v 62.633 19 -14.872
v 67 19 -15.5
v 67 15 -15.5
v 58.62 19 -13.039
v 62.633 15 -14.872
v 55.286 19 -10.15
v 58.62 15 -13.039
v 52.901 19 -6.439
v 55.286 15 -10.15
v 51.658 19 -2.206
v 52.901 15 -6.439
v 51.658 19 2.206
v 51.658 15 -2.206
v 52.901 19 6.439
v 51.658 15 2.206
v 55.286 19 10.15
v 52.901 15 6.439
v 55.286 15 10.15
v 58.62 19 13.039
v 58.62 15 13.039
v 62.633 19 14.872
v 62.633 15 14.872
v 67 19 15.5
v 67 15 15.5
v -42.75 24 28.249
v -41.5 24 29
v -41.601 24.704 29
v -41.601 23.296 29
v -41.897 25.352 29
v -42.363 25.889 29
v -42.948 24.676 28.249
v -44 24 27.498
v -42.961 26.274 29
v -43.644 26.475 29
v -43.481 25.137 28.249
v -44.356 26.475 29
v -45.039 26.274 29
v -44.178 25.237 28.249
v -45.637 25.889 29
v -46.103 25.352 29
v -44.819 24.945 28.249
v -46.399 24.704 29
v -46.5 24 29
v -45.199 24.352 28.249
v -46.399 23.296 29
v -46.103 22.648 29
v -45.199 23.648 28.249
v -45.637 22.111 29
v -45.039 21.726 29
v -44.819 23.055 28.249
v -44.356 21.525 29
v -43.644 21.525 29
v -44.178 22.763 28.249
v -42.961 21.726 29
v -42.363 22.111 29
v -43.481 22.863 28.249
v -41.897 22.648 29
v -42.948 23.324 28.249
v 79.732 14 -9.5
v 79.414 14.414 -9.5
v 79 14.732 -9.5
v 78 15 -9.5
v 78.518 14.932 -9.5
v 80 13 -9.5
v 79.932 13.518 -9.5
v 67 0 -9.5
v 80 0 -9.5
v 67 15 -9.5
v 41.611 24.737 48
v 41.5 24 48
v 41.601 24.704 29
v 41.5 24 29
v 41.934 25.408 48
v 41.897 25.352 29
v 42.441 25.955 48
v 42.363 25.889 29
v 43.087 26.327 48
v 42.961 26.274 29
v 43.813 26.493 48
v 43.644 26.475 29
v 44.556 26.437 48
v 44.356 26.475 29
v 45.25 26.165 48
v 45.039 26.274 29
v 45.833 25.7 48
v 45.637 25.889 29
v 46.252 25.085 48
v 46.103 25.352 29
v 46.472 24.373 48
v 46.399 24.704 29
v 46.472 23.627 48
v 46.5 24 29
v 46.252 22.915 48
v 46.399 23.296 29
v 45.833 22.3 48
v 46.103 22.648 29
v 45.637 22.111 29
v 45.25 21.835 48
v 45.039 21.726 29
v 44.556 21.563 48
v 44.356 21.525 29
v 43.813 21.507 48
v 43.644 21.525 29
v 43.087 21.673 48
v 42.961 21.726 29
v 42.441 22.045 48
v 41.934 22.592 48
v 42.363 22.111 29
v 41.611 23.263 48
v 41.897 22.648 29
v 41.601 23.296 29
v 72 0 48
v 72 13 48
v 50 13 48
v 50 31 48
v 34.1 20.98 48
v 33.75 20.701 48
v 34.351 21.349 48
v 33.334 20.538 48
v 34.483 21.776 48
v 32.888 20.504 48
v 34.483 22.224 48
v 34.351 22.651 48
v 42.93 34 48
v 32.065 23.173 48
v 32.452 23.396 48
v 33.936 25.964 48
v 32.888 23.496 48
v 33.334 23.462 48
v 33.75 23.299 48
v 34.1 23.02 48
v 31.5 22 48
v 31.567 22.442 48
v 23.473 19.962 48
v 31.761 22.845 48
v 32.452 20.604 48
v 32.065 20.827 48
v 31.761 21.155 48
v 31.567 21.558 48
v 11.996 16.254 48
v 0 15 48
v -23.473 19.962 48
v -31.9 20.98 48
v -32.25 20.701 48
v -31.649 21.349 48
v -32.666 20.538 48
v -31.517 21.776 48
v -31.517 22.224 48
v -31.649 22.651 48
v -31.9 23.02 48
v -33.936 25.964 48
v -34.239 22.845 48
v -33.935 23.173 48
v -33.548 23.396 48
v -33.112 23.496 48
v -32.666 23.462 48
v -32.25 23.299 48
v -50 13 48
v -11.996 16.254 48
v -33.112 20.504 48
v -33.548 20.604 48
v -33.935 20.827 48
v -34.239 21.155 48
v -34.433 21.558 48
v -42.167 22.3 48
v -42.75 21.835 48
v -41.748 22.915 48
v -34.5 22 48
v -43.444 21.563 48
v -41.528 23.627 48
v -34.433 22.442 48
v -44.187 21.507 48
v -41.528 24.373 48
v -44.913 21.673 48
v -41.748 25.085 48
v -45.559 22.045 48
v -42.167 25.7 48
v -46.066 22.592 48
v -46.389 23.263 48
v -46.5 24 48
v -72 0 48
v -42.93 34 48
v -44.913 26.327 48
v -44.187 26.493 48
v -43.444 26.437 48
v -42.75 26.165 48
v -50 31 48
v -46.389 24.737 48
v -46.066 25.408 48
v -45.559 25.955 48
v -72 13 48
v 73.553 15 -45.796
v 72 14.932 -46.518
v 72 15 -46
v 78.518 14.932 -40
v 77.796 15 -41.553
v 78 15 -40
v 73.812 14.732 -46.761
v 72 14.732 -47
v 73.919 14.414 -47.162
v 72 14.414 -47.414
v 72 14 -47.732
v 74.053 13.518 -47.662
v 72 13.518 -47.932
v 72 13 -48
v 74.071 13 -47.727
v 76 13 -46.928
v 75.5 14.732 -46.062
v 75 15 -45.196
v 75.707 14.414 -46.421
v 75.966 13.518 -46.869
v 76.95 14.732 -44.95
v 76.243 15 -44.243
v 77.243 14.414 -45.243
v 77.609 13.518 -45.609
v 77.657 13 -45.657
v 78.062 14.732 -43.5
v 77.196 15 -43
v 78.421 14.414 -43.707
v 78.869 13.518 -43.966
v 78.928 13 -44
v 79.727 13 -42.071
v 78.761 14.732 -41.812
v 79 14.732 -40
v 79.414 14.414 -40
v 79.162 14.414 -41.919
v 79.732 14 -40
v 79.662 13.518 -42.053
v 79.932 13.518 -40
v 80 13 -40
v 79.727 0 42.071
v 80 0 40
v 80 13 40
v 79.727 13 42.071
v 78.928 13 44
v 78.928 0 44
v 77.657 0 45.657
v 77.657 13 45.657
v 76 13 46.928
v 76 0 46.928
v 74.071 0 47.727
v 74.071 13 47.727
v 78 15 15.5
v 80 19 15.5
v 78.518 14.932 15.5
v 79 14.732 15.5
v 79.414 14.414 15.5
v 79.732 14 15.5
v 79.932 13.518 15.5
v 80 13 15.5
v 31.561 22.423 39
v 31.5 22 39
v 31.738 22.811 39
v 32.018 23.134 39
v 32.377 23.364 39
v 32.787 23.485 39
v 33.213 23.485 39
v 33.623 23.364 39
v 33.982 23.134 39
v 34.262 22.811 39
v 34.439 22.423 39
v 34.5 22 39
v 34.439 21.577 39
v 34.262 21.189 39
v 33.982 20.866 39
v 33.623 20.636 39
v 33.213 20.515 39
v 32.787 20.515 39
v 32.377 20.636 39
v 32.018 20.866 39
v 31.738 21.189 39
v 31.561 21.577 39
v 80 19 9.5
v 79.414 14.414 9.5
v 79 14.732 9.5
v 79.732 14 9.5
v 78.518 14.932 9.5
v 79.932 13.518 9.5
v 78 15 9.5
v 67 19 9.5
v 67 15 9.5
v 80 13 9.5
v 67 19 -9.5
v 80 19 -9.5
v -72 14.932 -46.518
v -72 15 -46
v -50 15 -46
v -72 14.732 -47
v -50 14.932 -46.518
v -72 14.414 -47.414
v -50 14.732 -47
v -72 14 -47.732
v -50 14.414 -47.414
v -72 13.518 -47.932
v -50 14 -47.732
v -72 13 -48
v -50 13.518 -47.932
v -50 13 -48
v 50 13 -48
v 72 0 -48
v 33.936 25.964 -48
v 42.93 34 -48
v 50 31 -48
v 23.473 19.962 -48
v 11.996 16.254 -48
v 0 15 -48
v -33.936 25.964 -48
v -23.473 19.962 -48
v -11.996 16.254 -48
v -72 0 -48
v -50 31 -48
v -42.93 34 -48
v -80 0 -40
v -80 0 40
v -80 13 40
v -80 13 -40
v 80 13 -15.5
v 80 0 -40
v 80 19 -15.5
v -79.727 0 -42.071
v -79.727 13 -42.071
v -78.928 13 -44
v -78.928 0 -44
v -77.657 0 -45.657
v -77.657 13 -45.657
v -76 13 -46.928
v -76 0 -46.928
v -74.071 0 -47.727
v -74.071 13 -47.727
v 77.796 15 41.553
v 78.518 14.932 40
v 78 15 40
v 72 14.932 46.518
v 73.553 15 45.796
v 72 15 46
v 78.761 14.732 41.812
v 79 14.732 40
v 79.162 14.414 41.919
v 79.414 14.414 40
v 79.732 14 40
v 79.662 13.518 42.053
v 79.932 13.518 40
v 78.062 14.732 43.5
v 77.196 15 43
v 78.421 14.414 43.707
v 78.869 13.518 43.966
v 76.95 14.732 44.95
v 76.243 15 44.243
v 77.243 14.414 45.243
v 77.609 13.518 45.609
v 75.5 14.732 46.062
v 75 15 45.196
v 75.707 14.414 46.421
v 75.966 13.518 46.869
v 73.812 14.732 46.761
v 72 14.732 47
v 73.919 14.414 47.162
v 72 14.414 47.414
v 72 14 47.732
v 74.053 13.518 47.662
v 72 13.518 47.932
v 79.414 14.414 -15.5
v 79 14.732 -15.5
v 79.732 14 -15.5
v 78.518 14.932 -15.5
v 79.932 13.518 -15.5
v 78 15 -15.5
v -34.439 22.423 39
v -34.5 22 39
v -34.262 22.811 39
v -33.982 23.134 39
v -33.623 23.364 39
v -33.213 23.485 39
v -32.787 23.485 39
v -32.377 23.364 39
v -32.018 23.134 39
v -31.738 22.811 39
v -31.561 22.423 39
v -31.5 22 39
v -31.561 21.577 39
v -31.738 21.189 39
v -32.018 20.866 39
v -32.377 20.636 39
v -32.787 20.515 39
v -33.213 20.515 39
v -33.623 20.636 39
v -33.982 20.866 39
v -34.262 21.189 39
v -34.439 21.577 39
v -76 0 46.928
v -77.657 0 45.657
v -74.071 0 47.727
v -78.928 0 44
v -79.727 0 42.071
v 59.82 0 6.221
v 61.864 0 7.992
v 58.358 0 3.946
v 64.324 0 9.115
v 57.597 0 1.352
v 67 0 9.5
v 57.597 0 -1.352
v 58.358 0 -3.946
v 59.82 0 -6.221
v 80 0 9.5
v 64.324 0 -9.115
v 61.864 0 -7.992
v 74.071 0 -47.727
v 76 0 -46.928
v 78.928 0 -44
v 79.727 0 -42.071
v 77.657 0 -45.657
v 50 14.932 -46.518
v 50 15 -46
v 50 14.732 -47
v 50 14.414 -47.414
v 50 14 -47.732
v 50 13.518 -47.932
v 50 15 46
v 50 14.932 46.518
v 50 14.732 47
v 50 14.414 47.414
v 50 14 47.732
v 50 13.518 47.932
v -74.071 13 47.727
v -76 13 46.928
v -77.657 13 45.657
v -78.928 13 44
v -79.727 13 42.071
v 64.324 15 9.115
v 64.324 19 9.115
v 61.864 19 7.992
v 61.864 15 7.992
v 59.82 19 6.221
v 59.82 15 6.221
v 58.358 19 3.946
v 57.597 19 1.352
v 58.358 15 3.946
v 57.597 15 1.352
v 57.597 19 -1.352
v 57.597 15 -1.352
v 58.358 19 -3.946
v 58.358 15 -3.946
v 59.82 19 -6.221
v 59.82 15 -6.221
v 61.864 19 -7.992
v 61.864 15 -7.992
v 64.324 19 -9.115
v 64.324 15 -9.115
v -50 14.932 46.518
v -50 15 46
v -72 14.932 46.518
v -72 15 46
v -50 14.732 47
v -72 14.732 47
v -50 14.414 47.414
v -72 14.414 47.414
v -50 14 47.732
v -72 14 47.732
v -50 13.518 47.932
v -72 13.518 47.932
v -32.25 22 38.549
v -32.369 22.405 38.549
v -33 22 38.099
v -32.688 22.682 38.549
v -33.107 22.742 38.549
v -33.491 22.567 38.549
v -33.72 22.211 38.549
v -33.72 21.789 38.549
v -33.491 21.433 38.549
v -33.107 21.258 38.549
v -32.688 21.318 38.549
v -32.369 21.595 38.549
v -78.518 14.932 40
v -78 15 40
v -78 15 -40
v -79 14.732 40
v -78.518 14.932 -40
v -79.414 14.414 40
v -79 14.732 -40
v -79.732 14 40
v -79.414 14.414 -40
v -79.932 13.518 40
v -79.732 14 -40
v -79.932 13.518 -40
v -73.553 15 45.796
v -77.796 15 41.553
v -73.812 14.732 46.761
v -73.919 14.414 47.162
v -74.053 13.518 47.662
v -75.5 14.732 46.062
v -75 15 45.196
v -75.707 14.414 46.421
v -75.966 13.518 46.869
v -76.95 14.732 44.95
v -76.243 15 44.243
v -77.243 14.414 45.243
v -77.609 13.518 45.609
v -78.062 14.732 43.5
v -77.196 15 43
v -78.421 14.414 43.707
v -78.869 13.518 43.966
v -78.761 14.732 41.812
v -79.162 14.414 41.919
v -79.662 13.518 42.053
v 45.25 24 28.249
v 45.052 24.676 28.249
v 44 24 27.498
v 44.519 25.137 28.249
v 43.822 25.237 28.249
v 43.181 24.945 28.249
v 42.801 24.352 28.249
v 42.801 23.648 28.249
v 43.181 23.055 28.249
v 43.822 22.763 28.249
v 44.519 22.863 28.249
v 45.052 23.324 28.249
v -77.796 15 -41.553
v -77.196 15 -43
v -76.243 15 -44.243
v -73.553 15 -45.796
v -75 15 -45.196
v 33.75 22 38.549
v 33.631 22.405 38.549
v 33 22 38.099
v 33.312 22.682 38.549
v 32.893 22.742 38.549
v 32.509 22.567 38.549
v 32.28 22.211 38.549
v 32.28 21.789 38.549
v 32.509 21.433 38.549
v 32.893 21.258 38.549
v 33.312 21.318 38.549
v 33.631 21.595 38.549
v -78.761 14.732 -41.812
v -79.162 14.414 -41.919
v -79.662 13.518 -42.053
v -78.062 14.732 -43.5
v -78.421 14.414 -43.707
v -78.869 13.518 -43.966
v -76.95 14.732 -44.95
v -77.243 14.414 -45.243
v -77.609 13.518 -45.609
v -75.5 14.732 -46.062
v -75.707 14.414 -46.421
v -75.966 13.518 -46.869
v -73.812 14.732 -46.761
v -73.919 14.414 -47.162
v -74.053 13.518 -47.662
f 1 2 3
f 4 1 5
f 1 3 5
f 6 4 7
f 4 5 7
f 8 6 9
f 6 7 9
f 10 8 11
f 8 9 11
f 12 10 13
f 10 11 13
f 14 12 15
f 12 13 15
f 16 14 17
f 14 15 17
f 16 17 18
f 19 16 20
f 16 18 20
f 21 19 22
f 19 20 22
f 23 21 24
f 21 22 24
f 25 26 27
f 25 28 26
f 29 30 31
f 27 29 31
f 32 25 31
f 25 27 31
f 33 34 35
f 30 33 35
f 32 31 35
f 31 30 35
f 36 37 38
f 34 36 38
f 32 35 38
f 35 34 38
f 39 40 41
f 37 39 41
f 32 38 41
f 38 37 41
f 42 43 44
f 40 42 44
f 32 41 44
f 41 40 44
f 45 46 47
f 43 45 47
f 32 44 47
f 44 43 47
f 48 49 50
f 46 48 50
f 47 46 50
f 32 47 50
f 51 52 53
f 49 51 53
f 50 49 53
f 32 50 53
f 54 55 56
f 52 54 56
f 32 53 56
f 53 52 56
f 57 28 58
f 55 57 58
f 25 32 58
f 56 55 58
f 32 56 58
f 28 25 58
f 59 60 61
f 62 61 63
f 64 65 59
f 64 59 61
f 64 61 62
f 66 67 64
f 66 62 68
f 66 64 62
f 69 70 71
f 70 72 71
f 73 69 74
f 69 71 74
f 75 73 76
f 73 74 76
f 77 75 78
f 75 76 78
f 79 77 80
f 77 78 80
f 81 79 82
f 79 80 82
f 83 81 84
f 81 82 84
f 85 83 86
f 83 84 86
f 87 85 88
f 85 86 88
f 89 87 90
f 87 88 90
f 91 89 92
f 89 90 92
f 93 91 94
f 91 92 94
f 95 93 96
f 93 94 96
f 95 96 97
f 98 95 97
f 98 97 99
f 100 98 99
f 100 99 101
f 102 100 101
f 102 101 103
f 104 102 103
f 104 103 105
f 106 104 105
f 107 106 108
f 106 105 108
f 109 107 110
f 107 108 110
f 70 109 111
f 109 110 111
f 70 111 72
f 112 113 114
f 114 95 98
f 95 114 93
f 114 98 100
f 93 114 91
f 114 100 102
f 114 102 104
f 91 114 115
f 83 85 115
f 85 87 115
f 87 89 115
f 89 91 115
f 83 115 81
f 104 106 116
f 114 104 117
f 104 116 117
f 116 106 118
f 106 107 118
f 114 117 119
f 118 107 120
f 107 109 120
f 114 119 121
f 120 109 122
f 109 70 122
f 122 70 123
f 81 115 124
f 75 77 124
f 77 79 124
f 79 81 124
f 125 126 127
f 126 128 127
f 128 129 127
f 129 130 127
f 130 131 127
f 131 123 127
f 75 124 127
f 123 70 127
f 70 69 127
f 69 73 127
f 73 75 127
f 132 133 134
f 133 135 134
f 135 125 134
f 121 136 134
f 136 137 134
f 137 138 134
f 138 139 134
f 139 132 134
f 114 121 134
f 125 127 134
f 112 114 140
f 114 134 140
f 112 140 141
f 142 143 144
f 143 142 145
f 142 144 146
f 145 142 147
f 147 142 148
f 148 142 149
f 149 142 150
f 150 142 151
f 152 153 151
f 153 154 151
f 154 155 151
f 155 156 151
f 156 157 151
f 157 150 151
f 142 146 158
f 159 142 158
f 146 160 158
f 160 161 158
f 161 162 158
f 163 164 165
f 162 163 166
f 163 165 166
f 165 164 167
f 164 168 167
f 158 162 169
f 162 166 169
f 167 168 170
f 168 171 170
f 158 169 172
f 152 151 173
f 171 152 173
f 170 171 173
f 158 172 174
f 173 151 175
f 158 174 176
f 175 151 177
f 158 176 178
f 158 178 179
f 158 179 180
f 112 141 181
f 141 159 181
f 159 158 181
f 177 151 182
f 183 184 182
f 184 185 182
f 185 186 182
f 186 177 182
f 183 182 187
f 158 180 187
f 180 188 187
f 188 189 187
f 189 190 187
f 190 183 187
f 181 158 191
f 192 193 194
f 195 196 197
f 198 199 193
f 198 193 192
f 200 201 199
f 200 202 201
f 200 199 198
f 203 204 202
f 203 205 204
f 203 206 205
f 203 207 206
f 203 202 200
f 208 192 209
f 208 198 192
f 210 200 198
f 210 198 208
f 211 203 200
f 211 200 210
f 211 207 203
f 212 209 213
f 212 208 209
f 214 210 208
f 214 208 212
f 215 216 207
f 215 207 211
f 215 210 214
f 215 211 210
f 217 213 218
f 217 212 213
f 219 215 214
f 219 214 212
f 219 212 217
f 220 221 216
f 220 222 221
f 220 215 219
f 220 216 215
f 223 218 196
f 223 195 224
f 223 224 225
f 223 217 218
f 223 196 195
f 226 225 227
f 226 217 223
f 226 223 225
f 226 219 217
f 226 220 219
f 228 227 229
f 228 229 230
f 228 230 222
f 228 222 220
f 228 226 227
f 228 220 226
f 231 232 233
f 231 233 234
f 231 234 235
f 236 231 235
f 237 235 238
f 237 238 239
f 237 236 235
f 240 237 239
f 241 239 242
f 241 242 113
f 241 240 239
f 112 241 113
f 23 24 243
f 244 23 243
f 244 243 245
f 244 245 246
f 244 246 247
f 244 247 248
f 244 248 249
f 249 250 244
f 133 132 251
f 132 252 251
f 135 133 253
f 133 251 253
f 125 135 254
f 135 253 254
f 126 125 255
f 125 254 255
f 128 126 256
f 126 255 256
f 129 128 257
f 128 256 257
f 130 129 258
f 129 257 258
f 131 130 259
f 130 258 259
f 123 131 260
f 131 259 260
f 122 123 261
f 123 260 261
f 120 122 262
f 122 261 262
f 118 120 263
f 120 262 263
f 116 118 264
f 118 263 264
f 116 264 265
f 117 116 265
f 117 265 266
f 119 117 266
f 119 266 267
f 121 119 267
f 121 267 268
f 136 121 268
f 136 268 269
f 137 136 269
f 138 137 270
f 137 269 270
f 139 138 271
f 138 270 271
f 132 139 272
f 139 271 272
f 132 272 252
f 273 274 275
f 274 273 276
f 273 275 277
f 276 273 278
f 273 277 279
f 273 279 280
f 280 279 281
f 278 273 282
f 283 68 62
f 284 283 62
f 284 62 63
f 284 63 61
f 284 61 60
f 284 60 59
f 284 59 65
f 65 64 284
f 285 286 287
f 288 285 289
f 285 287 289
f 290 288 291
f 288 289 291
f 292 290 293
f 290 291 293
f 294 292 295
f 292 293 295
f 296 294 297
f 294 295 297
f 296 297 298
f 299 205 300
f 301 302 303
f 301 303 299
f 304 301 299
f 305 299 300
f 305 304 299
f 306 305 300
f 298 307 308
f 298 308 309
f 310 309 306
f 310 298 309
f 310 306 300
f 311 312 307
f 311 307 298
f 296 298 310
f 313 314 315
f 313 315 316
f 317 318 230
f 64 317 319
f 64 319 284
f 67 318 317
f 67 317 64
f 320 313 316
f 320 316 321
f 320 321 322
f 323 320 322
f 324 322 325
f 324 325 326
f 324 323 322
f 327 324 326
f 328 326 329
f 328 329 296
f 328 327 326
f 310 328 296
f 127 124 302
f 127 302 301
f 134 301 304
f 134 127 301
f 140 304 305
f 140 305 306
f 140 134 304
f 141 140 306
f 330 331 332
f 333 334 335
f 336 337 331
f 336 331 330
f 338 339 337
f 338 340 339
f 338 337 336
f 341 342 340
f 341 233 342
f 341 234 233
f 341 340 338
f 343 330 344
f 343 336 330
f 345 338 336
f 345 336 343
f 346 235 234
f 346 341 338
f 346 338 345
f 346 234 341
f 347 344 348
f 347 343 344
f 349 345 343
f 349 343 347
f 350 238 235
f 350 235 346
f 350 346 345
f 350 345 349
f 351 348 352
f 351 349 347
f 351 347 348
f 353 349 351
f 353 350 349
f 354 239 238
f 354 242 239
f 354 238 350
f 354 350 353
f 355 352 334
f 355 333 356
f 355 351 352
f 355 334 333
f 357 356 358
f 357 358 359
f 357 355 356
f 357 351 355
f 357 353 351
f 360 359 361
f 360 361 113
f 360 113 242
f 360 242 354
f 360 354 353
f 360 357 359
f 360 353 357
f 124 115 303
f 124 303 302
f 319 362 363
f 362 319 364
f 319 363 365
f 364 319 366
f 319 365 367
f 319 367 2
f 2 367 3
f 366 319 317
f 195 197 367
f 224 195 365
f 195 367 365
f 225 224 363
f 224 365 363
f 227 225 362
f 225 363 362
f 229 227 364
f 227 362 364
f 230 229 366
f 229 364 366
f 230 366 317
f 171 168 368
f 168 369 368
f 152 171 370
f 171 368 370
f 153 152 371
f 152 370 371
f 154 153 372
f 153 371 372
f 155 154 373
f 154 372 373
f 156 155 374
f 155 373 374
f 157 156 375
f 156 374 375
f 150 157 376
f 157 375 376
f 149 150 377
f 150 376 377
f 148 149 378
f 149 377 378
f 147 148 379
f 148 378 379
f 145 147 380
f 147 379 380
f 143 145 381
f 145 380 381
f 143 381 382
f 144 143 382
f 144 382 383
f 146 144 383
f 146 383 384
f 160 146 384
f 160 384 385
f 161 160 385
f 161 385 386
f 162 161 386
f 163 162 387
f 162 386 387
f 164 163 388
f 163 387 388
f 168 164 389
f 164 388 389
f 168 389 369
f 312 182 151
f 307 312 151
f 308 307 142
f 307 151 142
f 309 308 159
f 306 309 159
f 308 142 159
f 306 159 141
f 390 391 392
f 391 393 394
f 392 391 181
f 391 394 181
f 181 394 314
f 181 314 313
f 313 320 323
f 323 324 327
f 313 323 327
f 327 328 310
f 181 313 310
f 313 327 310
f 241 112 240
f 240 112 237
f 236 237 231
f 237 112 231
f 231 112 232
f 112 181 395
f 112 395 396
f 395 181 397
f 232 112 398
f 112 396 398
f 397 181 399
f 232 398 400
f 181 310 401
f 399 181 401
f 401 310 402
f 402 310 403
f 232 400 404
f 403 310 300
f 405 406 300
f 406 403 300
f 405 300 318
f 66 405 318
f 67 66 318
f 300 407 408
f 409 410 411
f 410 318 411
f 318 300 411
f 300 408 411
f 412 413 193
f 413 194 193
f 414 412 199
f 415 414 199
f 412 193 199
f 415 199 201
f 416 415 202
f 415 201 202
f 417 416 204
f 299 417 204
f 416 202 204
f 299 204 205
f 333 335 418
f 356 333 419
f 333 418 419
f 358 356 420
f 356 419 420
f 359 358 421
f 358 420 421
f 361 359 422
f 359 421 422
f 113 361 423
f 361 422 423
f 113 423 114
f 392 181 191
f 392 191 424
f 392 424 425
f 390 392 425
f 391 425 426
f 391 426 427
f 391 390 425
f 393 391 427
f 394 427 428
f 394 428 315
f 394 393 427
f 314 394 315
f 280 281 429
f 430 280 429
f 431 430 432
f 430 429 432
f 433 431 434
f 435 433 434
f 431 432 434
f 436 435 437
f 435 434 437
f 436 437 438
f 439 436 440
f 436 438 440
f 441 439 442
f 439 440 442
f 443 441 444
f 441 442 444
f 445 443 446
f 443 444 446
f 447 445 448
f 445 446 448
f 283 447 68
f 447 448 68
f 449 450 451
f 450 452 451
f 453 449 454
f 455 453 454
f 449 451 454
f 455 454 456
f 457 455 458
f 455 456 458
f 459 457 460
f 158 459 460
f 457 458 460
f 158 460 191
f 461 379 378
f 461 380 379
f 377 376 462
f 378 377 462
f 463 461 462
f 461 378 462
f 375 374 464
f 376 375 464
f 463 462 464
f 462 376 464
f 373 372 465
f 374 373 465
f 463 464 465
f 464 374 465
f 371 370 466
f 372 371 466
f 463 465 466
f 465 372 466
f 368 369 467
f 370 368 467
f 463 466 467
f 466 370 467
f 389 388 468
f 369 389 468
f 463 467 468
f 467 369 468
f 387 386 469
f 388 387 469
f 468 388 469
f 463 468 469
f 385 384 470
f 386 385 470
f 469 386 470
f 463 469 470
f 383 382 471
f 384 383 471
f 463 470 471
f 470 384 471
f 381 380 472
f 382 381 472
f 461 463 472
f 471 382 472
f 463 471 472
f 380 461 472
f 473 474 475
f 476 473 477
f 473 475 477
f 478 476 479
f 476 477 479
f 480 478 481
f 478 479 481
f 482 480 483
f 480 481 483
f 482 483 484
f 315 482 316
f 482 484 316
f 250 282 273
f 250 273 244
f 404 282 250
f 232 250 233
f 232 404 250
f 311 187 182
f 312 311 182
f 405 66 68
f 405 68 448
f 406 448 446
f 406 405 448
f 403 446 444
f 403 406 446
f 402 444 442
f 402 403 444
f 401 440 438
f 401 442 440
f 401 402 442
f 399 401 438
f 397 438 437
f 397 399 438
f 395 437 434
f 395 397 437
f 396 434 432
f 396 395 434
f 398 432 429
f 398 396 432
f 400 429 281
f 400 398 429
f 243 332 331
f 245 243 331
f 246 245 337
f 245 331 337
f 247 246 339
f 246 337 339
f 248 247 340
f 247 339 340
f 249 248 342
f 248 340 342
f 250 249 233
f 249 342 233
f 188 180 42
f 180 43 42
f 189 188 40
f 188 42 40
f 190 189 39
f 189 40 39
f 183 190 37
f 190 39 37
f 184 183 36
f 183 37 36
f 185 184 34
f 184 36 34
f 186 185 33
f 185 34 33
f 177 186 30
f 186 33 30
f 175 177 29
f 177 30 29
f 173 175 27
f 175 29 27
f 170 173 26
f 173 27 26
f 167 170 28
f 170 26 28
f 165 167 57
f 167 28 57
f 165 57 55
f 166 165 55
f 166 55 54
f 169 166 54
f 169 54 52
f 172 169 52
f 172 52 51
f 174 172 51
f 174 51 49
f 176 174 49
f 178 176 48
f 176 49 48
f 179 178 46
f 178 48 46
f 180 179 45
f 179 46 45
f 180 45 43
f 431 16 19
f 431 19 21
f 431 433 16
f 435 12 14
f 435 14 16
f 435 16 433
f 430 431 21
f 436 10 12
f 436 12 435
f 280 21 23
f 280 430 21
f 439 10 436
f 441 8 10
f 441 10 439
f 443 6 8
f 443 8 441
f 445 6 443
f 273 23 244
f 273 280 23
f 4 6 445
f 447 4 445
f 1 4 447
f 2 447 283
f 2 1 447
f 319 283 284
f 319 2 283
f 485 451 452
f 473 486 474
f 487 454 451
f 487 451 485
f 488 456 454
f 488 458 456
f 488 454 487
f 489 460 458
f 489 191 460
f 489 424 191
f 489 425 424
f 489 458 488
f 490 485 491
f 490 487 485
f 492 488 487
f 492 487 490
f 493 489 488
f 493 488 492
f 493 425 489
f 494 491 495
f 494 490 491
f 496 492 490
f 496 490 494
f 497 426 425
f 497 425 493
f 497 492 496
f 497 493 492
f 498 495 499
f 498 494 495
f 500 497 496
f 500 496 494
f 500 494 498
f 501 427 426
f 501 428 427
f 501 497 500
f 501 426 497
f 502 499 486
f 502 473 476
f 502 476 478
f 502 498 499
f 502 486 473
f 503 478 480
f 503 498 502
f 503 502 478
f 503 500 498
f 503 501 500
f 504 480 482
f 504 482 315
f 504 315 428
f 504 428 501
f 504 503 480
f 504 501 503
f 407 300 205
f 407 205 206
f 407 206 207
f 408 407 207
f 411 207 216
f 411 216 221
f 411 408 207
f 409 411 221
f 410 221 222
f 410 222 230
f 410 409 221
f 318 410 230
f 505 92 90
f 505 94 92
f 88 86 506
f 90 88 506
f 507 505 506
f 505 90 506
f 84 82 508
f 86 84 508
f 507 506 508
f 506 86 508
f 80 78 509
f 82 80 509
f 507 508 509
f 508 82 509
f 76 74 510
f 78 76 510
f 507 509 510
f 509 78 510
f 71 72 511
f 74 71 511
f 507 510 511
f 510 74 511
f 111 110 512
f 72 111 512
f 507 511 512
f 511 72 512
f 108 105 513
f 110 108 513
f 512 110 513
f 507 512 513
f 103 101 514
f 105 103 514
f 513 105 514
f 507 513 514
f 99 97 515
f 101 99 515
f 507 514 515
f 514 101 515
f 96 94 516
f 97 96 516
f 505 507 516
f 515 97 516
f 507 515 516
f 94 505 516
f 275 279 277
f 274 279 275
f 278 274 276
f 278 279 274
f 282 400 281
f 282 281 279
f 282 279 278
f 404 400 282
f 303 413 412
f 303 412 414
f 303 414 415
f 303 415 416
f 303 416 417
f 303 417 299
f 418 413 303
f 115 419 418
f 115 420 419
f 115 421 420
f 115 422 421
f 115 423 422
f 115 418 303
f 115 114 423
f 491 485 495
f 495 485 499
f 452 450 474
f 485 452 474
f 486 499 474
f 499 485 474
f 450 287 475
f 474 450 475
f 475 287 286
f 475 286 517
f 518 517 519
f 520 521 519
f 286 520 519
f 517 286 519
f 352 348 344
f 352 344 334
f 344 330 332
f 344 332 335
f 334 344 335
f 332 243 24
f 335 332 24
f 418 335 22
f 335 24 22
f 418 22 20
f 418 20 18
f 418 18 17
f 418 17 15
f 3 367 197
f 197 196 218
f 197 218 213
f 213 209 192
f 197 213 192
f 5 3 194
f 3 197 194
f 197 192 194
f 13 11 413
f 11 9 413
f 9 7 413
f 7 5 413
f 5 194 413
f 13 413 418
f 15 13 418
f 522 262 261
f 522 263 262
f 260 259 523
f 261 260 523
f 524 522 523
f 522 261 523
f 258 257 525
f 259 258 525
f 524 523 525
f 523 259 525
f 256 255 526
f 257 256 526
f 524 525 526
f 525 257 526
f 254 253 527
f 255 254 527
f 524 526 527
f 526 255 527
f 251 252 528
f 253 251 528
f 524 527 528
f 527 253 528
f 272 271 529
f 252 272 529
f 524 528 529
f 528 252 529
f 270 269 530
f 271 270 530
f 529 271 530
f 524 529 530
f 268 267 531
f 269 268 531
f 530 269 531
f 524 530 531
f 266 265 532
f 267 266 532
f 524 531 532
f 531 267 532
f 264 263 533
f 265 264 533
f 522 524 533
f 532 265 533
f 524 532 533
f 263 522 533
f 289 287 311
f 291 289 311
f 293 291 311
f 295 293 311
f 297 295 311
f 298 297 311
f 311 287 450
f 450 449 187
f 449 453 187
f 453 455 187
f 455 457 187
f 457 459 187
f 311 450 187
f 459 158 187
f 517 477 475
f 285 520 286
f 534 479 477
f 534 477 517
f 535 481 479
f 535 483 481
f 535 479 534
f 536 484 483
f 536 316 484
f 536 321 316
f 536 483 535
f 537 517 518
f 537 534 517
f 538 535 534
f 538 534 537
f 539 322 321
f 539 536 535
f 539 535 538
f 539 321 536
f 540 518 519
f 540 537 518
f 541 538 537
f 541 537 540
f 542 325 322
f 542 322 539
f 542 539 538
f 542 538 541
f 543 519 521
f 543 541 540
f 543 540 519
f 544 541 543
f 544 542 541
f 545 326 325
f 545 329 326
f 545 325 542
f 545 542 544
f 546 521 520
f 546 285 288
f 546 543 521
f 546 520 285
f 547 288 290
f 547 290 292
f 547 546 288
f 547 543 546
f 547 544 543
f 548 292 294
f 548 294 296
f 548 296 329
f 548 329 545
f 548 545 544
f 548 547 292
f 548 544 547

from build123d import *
from build123d.topology import SkipClean

# Parameters (mm, degrees)
EXTRUDE_1_DEPTH           = 15
EXTRUDE_2_DEPTH           = 48
HOLE_WIZARD_M6_1_D        = 5
HOLE_WIZARD_M6_1_DEPTH    = 19
HOLE_WIZARD_M6_1_TIP      = 1.502151548
HOLE_WIZARD_3_0_3_1_D     = 3
HOLE_WIZARD_3_0_3_1_DEPTH = 9
HOLE_WIZARD_3_0_3_1_TIP   = 0.901290929
FILLET_1_R                = 2
EXTRUDE_3_DEPTH           = 19
CUT_EXTRUDE_4_DEPTH       = 100.297532698


with BuildPart() as part:
    # 草圖1 → 伸長1 (new body)
    with BuildSketch(Plane(origin=(0, 0, 0), x_dir=(1, 0, 0), z_dir=(0, 1, 0))):
        with BuildLine():
            Line((-72, 48), (72, 48))
            ThreePointArc((72, 48), (77.656854249, 45.656854249), (80, 40))
            Line((80, 40), (80, -40))
            ThreePointArc((80, -40), (77.656854249, -45.656854249), (72, -48))
            Line((72, -48), (-72, -48))
            ThreePointArc((-72, -48), (-77.656854249, -45.656854249), (-80, -40))
            Line((-80, -40), (-80, 40))
            ThreePointArc((-80, 40), (-77.656854249, 45.656854249), (-72, 48))
        make_face()
    extrude(amount=EXTRUDE_1_DEPTH)

    # 草圖3 → 伸長2 (add, symmetric)
    with BuildSketch(Plane.XY):
        with BuildLine():
            Line((50, 15), (50, 31))
            Line((50, 31), (42.930175867, 34))
            ThreePointArc((42.930175867, 34), (23.473389189, 19.962277575), (0, 15))
            Line((0, 15), (50, 15))
        make_face()
    extrude_2 = extrude(amount=EXTRUDE_2_DEPTH, both=True)

    # 鏡射1: 伸長2 across plane
    add(extrude_2.mirror(Plane(origin=(0, 0, 0), x_dir=(0, 0, 1), z_dir=(1, 0, 0))))

    # M6 螺紋孔1
    with Locations(Plane.XY.offset(48)):
        with Locations((44, 24), (-44, 24)):
            Hole(HOLE_WIZARD_M6_1_D / 2, depth=HOLE_WIZARD_M6_1_DEPTH)
            with Locations((0, 0, -(HOLE_WIZARD_M6_1_DEPTH + HOLE_WIZARD_M6_1_TIP / 2))):  # 118° drill point
                Cone(0, HOLE_WIZARD_M6_1_D / 2, HOLE_WIZARD_M6_1_TIP, mode=Mode.SUBTRACT)

    # Ø3.0 (3) 直徑孔1
    with Locations(Plane.XY.offset(48)):
        with Locations((33, 22), (-33, 22)):
            Hole(HOLE_WIZARD_3_0_3_1_D / 2, depth=HOLE_WIZARD_3_0_3_1_DEPTH)
            with Locations((0, 0, -(HOLE_WIZARD_3_0_3_1_DEPTH + HOLE_WIZARD_3_0_3_1_TIP / 2))):  # 118° drill point
                Cone(0, HOLE_WIZARD_3_0_3_1_D / 2, HOLE_WIZARD_3_0_3_1_TIP, mode=Mode.SUBTRACT)

    # 圓角1
    fillet_1_edges = [part.edges().sort_by_distance(p)[0] for p in [
        (-77.656854249, 15, -45.656854249),
        (-80, 15, 0),
        (-77.656854249, 15, 45.656854249),
        (-61, 15, 48),
        (77.656854249, 15, 45.656854249),
        (61, 15, 48),
        (80, 15, 0),
        (-61, 15, -48),
        (77.656854249, 15, -45.656854249),
        (61, 15, -48),
    ]]
    fillet(fillet_1_edges, radius=FILLET_1_R)

    # 草圖2 → 伸長3 (add)
    with BuildSketch(Plane(origin=(0, 0, 0), x_dir=(1, 0, 0), z_dir=(0, 1, 0))):
        with BuildLine():
            Line((67, 9.5), (80, 9.5))
            Line((80, 9.5), (80, 15.5))
            Line((80, 15.5), (67, 15.5))
            ThreePointArc((67, 15.5), (51.5, 0), (67, -15.5))
            Line((67, -15.5), (80, -15.5))
            Line((80, -15.5), (80, -9.5))
            Line((80, -9.5), (67, -9.5))
            ThreePointArc((67, -9.5), (57.5, 0), (67, 9.5))
        make_face()
    extrude(amount=EXTRUDE_3_DEPTH)

    # 草圖2<3> → 伸長4 (cut, through all)
    with SkipClean():  # the faces are left unmerged after this step: merging them gives an invalid solid
        with BuildSketch(Plane(origin=(0, 0, 0), x_dir=(1, 0, 0), z_dir=(0, 1, 0))):
            with BuildLine():
                Line((80, -9.5), (80, 9.5))
                Line((80, 9.5), (67, 9.5))
                ThreePointArc((67, 9.5), (57.5, 0), (67, -9.5))
                Line((67, -9.5), (80, -9.5))
            make_face()
        extrude(amount=CUT_EXTRUDE_4_DEPTH, mode=Mode.SUBTRACT)


solid = part.part
